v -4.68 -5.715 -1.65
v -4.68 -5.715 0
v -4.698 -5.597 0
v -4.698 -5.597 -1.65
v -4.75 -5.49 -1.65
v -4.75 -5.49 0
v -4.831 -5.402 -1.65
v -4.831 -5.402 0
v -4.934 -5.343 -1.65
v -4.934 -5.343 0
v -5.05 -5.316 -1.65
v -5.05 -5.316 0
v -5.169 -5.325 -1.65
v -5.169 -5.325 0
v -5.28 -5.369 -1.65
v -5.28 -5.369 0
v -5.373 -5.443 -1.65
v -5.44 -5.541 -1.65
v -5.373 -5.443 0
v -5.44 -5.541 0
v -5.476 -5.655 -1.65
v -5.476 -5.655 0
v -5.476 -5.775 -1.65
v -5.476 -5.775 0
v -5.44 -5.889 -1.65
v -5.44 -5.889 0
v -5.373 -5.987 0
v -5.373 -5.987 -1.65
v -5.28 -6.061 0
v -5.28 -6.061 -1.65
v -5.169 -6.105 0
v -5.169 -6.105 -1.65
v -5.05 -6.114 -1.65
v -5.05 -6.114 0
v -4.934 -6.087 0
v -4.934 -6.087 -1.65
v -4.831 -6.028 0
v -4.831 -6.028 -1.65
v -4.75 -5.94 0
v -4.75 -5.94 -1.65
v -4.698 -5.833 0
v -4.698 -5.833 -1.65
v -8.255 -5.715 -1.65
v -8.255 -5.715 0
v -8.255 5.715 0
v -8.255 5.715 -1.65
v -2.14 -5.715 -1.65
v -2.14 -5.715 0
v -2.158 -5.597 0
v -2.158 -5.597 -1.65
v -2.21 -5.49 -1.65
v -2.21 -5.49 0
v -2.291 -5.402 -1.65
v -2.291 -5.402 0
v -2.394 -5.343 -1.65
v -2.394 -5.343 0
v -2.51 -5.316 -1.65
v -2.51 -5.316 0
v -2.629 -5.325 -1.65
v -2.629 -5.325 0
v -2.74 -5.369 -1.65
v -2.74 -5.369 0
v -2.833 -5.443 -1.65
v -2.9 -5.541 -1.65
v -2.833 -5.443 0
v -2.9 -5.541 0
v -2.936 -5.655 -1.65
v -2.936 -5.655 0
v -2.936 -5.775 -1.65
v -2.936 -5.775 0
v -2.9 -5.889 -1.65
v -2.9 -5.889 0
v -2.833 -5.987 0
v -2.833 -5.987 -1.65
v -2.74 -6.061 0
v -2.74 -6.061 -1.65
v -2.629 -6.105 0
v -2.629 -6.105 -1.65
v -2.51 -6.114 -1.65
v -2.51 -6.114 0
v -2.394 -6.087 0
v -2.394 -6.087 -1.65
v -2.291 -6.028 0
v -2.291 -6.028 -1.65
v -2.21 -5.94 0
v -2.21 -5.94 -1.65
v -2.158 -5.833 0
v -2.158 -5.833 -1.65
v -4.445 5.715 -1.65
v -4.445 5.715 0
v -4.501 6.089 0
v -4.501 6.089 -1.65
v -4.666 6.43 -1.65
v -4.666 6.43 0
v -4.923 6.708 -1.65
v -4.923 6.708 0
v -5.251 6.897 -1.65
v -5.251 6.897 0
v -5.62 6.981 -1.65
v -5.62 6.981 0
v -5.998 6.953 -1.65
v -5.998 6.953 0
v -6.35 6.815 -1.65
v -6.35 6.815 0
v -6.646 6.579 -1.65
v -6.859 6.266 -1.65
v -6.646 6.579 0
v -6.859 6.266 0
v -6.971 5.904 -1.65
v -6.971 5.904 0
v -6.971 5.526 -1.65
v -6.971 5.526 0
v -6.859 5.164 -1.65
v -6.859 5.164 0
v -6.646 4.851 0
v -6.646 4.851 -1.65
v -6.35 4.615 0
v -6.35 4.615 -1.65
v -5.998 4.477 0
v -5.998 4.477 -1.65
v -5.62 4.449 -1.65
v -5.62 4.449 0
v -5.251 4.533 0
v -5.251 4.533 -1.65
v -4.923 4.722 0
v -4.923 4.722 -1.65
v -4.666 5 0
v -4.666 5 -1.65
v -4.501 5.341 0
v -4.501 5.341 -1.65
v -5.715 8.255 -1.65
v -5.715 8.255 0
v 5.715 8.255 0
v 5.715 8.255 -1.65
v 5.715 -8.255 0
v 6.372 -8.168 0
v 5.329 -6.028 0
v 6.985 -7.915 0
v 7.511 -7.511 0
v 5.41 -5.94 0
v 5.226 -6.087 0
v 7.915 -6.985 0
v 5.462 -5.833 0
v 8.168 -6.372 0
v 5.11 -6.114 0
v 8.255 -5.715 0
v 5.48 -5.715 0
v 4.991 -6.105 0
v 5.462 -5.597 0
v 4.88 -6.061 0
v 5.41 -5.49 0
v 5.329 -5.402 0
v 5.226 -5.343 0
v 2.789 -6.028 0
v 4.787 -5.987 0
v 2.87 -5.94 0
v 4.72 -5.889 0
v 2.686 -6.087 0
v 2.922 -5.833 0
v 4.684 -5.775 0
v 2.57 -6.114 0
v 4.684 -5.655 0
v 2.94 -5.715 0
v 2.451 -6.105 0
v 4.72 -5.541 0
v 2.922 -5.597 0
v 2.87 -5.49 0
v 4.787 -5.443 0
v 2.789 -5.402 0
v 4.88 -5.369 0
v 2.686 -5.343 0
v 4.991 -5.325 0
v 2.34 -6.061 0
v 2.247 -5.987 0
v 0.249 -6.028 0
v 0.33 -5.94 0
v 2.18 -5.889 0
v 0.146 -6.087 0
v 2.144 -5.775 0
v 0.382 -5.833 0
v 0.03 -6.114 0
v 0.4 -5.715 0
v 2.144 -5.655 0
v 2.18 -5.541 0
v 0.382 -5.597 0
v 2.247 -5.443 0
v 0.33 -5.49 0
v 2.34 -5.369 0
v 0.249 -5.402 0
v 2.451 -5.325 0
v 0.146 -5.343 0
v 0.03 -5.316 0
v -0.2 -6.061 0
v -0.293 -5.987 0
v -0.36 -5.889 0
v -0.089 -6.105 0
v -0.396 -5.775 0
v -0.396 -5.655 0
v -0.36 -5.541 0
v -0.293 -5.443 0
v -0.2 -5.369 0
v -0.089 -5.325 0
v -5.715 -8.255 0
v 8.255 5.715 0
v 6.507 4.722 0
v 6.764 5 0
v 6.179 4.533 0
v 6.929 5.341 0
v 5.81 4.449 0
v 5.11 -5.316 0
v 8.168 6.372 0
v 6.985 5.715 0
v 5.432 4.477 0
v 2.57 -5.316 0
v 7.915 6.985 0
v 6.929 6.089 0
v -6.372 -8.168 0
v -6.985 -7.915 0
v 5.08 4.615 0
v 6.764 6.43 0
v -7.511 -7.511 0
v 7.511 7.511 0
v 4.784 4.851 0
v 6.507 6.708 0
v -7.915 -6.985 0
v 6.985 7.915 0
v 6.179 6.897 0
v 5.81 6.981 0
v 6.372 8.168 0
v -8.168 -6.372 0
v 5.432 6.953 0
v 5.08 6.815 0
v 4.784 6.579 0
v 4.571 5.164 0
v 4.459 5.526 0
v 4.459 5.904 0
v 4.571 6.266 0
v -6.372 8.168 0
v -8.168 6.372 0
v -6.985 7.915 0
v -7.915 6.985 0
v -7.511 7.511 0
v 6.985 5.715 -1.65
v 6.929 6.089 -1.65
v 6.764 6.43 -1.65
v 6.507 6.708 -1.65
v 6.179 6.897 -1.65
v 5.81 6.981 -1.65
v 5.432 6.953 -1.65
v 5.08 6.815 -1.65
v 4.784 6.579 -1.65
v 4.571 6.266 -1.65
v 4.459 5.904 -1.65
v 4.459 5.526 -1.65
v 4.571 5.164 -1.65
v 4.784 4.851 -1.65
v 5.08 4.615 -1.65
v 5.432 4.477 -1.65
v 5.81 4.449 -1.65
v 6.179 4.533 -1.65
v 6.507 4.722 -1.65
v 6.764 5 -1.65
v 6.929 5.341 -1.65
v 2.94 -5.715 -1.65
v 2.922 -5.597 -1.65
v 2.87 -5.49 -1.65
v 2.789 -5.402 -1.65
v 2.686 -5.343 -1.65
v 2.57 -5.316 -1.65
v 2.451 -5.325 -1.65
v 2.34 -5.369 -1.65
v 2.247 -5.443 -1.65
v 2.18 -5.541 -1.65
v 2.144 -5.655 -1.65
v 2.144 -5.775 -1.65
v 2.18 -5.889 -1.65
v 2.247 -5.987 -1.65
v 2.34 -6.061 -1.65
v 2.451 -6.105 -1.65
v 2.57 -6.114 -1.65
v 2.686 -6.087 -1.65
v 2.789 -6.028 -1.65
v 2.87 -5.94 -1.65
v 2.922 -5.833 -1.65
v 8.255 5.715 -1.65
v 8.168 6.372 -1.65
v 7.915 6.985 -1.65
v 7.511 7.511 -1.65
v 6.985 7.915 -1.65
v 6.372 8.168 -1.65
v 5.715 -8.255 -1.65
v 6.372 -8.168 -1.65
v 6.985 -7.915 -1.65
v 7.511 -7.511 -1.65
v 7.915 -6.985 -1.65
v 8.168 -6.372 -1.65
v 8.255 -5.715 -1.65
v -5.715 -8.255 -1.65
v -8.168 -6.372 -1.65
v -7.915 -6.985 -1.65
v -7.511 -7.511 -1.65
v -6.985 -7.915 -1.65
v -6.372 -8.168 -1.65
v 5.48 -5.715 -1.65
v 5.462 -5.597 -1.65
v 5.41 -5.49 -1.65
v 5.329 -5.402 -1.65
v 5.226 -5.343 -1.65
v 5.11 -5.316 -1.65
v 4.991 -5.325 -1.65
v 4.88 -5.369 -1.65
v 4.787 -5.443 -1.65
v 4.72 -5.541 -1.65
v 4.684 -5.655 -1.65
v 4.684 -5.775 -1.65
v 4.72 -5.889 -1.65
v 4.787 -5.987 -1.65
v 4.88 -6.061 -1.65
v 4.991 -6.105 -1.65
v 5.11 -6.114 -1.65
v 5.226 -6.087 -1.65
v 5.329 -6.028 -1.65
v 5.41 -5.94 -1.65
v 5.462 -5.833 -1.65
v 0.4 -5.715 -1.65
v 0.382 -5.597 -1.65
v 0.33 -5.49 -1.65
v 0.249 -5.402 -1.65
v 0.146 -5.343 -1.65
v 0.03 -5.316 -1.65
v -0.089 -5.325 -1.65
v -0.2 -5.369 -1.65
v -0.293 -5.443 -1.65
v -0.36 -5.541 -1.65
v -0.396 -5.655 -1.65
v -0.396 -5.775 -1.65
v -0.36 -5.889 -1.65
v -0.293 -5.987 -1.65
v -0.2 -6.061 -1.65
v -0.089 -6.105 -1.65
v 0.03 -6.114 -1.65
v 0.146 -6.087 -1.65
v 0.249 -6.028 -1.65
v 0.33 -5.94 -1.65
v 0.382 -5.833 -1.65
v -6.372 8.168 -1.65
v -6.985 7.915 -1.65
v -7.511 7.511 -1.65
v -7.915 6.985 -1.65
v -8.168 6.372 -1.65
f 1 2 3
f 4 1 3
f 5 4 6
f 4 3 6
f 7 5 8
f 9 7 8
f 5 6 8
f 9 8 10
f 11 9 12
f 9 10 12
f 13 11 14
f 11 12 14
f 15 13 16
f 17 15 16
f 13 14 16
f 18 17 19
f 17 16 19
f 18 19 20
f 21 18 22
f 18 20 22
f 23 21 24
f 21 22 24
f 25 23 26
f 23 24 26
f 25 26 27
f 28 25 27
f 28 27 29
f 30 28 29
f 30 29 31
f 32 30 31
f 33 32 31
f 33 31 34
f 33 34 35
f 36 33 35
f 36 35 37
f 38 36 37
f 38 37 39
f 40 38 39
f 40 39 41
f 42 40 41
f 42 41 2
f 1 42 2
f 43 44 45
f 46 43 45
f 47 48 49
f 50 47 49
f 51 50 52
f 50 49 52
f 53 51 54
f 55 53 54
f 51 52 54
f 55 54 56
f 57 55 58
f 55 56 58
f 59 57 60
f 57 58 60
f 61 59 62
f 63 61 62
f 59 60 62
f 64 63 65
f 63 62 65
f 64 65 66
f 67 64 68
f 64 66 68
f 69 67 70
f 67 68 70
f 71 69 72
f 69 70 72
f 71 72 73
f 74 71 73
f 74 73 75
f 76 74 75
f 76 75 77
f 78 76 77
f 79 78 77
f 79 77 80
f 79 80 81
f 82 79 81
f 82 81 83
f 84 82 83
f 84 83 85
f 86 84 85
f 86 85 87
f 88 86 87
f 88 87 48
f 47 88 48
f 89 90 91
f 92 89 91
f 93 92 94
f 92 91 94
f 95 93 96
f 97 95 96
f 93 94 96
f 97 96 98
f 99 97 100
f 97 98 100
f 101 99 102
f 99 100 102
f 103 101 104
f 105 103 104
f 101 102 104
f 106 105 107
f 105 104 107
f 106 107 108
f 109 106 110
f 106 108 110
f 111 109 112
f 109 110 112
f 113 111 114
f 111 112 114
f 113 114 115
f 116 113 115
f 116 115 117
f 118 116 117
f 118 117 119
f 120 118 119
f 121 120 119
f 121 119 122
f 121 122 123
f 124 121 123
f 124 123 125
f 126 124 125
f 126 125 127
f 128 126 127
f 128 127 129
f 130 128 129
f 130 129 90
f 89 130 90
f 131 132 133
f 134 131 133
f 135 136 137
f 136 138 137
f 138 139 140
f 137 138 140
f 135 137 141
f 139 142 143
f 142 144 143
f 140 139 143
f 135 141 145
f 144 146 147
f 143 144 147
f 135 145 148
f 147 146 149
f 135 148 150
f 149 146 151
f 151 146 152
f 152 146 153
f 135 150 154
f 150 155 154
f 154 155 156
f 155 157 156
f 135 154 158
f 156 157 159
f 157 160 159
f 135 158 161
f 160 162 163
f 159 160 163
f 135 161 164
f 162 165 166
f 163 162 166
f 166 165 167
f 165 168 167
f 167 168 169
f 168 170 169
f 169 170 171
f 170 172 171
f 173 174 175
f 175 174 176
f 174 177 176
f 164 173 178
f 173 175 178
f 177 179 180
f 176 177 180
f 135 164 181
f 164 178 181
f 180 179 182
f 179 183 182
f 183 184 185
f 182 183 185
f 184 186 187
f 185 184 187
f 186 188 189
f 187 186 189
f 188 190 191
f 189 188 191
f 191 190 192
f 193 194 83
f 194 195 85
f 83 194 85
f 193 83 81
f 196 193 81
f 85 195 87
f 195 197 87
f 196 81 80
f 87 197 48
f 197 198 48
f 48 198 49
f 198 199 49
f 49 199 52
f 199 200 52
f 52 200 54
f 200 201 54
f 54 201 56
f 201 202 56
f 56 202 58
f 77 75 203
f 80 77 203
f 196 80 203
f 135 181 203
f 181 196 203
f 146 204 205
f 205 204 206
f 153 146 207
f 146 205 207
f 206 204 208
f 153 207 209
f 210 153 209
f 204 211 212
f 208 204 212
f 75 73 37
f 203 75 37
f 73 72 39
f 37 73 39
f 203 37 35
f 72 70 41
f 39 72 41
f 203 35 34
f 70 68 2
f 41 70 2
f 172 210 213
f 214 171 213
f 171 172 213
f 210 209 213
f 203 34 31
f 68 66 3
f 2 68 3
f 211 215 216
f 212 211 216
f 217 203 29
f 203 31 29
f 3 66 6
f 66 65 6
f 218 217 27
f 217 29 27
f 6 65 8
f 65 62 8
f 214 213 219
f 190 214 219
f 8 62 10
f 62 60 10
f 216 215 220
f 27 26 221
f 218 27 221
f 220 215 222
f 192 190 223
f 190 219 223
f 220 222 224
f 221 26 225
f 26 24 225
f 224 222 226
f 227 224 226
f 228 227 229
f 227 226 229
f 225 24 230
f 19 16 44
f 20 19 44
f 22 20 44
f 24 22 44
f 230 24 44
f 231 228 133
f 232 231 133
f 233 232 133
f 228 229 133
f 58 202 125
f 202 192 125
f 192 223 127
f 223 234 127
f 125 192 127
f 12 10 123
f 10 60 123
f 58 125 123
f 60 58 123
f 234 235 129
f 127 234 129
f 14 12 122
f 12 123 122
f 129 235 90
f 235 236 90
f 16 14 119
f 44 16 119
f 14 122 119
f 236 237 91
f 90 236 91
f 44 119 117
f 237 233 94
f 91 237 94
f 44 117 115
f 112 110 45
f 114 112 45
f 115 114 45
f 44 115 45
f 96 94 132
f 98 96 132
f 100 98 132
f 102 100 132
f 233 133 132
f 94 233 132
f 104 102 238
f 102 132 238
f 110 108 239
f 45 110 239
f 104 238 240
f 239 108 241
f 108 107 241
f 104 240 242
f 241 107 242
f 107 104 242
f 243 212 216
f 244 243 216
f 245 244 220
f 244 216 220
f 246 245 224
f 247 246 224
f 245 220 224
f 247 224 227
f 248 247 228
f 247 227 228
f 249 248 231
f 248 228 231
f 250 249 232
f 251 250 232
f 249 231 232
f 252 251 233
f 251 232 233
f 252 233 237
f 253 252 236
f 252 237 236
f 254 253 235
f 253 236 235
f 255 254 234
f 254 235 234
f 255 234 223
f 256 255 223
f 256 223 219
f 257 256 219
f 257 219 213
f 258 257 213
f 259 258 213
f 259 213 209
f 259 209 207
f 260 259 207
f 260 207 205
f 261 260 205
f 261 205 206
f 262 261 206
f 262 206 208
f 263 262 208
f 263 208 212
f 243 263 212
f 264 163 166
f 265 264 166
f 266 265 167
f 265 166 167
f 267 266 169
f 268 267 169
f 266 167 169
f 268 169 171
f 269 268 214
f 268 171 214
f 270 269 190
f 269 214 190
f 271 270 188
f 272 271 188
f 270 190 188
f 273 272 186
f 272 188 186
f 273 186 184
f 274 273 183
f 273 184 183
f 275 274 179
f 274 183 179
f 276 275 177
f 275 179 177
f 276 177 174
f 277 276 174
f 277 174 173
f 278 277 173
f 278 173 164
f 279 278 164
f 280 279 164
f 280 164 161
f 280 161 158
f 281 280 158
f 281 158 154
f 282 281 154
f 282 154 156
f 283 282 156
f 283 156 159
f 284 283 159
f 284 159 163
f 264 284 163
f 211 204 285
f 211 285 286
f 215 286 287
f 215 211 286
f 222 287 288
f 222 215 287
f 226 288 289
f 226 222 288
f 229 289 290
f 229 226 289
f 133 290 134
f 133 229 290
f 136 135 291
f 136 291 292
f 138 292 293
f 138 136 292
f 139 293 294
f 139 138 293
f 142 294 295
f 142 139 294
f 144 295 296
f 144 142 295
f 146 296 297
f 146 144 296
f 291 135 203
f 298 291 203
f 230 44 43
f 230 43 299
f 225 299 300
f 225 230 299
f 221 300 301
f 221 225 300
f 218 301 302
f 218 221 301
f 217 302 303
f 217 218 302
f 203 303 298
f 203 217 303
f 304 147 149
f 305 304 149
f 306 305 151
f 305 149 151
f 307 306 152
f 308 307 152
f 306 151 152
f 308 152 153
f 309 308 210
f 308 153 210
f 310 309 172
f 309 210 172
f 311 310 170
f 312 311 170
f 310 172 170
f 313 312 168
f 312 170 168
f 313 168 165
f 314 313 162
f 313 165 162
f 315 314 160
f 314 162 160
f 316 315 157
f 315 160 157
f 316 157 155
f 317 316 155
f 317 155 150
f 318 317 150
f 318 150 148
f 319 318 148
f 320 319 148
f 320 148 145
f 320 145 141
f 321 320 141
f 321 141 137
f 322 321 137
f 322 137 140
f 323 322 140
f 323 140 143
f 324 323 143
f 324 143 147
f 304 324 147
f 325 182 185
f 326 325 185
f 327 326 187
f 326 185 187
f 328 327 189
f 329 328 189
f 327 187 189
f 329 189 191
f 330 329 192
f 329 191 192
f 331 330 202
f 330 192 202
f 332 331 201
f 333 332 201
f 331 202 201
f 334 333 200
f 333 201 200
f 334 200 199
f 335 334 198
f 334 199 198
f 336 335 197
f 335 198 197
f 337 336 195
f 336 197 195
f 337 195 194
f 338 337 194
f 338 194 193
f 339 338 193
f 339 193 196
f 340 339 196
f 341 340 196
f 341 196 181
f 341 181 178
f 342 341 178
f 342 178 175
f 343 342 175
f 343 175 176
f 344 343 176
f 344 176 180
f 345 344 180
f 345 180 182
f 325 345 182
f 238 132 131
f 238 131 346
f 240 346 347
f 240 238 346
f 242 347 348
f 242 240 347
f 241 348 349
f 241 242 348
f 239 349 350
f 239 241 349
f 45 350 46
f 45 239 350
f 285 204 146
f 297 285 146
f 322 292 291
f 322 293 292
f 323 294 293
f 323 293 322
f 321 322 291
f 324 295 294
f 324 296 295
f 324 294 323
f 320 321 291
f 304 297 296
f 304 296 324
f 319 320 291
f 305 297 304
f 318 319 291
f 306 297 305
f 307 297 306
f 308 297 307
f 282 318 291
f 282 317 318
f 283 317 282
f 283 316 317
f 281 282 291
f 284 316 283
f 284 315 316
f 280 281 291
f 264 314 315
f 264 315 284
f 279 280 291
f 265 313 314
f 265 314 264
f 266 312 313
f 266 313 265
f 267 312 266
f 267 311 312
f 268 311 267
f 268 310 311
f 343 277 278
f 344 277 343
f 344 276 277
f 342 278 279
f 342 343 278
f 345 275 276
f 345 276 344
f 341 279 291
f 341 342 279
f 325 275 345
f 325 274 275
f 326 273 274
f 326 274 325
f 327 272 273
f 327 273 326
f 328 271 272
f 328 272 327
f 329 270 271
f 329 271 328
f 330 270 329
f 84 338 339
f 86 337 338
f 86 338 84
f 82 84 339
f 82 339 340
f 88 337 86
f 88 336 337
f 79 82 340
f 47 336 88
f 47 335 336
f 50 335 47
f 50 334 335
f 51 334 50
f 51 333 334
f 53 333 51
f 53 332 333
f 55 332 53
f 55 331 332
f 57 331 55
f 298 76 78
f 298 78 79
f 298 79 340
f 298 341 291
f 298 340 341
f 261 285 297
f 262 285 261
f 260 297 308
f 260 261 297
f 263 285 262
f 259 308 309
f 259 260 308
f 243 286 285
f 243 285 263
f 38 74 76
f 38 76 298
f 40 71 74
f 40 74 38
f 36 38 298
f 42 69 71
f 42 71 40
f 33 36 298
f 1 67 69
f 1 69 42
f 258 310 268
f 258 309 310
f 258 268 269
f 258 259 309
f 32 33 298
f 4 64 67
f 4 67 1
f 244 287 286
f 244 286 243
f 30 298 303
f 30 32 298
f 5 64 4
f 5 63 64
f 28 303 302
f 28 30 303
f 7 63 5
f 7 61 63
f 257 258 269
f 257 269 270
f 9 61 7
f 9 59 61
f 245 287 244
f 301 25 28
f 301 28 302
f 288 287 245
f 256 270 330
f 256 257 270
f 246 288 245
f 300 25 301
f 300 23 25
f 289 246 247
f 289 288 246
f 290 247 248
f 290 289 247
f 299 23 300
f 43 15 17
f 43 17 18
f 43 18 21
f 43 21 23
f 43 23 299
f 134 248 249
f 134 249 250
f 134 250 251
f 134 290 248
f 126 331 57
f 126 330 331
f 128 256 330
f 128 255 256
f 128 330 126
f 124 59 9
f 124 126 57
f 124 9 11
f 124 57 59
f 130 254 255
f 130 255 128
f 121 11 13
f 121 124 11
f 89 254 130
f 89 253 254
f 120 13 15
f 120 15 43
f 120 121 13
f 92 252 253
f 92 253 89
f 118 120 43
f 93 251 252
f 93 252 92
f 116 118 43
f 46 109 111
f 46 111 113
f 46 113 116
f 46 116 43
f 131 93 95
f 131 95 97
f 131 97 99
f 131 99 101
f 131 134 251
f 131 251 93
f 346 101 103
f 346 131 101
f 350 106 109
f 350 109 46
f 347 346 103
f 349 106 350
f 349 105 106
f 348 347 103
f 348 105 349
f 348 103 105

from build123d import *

# Parameters (mm, degrees)
PAD018_DEPTH           = 1.65
SKETCH050_R            = 1.27
POCKET030_DEPTH        = 1.651
SKETCH051_R            = 0.4
POCKET029_DEPTH        = 1.651
LINEARPATTERN004_COUNT = 3
LINEARPATTERN004_PITCH = 2.54
LINEARPATTERN005_COUNT = 3
LINEARPATTERN005_PITCH = 2.54


with BuildPart() as part:
    # Sketch049 → Pad018 (new body)
    with BuildSketch(Plane.XY):
        with BuildLine():
            Line((-5.715, 8.255), (5.715, 8.255))
            ThreePointArc((8.255, 5.715), (7.511051, 7.511051), (5.715, 8.255))
            Line((8.255, 5.715), (8.255, -5.715))
            ThreePointArc((5.715, -8.255), (7.511051, -7.511051), (8.255, -5.715))
            Line((5.715, -8.255), (-5.715, -8.255))
            ThreePointArc((-8.255, -5.715), (-7.511051, -7.511051), (-5.715, -8.255))
            Line((-8.255, -5.715), (-8.255, 5.715))
            ThreePointArc((-5.715, 8.255), (-7.511051, 7.511051), (-8.255, 5.715))
        make_face()
    extrude(amount=-PAD018_DEPTH)

    # Sketch050 → Pocket030 (cut, through all)
    with BuildSketch(Plane.XY):
        with Locations((-5.715, 5.715)):
            Circle(SKETCH050_R)
        with Locations((5.715, 5.715)):
            Circle(SKETCH050_R)
    extrude(amount=-POCKET030_DEPTH, mode=Mode.SUBTRACT)

    # Sketch051 → Pocket029 (cut, through all)
    with BuildSketch(Plane.XY):
        with Locations((0, -5.715)):
            Circle(SKETCH051_R)
    pocket029 = extrude(amount=-POCKET029_DEPTH, mode=Mode.SUBTRACT)

    # LinearPattern004: Pocket029 ×3
    with Locations(*[(i * LINEARPATTERN004_PITCH, 0, 0) for i in range(1, LINEARPATTERN004_COUNT)]):
        add(pocket029, mode=Mode.SUBTRACT)

    # LinearPattern005: Pocket029 ×3
    with Locations(*[(-i * LINEARPATTERN005_PITCH, 0, 0) for i in range(1, LINEARPATTERN005_COUNT)]):
        add(pocket029, mode=Mode.SUBTRACT)


solid = part.part
